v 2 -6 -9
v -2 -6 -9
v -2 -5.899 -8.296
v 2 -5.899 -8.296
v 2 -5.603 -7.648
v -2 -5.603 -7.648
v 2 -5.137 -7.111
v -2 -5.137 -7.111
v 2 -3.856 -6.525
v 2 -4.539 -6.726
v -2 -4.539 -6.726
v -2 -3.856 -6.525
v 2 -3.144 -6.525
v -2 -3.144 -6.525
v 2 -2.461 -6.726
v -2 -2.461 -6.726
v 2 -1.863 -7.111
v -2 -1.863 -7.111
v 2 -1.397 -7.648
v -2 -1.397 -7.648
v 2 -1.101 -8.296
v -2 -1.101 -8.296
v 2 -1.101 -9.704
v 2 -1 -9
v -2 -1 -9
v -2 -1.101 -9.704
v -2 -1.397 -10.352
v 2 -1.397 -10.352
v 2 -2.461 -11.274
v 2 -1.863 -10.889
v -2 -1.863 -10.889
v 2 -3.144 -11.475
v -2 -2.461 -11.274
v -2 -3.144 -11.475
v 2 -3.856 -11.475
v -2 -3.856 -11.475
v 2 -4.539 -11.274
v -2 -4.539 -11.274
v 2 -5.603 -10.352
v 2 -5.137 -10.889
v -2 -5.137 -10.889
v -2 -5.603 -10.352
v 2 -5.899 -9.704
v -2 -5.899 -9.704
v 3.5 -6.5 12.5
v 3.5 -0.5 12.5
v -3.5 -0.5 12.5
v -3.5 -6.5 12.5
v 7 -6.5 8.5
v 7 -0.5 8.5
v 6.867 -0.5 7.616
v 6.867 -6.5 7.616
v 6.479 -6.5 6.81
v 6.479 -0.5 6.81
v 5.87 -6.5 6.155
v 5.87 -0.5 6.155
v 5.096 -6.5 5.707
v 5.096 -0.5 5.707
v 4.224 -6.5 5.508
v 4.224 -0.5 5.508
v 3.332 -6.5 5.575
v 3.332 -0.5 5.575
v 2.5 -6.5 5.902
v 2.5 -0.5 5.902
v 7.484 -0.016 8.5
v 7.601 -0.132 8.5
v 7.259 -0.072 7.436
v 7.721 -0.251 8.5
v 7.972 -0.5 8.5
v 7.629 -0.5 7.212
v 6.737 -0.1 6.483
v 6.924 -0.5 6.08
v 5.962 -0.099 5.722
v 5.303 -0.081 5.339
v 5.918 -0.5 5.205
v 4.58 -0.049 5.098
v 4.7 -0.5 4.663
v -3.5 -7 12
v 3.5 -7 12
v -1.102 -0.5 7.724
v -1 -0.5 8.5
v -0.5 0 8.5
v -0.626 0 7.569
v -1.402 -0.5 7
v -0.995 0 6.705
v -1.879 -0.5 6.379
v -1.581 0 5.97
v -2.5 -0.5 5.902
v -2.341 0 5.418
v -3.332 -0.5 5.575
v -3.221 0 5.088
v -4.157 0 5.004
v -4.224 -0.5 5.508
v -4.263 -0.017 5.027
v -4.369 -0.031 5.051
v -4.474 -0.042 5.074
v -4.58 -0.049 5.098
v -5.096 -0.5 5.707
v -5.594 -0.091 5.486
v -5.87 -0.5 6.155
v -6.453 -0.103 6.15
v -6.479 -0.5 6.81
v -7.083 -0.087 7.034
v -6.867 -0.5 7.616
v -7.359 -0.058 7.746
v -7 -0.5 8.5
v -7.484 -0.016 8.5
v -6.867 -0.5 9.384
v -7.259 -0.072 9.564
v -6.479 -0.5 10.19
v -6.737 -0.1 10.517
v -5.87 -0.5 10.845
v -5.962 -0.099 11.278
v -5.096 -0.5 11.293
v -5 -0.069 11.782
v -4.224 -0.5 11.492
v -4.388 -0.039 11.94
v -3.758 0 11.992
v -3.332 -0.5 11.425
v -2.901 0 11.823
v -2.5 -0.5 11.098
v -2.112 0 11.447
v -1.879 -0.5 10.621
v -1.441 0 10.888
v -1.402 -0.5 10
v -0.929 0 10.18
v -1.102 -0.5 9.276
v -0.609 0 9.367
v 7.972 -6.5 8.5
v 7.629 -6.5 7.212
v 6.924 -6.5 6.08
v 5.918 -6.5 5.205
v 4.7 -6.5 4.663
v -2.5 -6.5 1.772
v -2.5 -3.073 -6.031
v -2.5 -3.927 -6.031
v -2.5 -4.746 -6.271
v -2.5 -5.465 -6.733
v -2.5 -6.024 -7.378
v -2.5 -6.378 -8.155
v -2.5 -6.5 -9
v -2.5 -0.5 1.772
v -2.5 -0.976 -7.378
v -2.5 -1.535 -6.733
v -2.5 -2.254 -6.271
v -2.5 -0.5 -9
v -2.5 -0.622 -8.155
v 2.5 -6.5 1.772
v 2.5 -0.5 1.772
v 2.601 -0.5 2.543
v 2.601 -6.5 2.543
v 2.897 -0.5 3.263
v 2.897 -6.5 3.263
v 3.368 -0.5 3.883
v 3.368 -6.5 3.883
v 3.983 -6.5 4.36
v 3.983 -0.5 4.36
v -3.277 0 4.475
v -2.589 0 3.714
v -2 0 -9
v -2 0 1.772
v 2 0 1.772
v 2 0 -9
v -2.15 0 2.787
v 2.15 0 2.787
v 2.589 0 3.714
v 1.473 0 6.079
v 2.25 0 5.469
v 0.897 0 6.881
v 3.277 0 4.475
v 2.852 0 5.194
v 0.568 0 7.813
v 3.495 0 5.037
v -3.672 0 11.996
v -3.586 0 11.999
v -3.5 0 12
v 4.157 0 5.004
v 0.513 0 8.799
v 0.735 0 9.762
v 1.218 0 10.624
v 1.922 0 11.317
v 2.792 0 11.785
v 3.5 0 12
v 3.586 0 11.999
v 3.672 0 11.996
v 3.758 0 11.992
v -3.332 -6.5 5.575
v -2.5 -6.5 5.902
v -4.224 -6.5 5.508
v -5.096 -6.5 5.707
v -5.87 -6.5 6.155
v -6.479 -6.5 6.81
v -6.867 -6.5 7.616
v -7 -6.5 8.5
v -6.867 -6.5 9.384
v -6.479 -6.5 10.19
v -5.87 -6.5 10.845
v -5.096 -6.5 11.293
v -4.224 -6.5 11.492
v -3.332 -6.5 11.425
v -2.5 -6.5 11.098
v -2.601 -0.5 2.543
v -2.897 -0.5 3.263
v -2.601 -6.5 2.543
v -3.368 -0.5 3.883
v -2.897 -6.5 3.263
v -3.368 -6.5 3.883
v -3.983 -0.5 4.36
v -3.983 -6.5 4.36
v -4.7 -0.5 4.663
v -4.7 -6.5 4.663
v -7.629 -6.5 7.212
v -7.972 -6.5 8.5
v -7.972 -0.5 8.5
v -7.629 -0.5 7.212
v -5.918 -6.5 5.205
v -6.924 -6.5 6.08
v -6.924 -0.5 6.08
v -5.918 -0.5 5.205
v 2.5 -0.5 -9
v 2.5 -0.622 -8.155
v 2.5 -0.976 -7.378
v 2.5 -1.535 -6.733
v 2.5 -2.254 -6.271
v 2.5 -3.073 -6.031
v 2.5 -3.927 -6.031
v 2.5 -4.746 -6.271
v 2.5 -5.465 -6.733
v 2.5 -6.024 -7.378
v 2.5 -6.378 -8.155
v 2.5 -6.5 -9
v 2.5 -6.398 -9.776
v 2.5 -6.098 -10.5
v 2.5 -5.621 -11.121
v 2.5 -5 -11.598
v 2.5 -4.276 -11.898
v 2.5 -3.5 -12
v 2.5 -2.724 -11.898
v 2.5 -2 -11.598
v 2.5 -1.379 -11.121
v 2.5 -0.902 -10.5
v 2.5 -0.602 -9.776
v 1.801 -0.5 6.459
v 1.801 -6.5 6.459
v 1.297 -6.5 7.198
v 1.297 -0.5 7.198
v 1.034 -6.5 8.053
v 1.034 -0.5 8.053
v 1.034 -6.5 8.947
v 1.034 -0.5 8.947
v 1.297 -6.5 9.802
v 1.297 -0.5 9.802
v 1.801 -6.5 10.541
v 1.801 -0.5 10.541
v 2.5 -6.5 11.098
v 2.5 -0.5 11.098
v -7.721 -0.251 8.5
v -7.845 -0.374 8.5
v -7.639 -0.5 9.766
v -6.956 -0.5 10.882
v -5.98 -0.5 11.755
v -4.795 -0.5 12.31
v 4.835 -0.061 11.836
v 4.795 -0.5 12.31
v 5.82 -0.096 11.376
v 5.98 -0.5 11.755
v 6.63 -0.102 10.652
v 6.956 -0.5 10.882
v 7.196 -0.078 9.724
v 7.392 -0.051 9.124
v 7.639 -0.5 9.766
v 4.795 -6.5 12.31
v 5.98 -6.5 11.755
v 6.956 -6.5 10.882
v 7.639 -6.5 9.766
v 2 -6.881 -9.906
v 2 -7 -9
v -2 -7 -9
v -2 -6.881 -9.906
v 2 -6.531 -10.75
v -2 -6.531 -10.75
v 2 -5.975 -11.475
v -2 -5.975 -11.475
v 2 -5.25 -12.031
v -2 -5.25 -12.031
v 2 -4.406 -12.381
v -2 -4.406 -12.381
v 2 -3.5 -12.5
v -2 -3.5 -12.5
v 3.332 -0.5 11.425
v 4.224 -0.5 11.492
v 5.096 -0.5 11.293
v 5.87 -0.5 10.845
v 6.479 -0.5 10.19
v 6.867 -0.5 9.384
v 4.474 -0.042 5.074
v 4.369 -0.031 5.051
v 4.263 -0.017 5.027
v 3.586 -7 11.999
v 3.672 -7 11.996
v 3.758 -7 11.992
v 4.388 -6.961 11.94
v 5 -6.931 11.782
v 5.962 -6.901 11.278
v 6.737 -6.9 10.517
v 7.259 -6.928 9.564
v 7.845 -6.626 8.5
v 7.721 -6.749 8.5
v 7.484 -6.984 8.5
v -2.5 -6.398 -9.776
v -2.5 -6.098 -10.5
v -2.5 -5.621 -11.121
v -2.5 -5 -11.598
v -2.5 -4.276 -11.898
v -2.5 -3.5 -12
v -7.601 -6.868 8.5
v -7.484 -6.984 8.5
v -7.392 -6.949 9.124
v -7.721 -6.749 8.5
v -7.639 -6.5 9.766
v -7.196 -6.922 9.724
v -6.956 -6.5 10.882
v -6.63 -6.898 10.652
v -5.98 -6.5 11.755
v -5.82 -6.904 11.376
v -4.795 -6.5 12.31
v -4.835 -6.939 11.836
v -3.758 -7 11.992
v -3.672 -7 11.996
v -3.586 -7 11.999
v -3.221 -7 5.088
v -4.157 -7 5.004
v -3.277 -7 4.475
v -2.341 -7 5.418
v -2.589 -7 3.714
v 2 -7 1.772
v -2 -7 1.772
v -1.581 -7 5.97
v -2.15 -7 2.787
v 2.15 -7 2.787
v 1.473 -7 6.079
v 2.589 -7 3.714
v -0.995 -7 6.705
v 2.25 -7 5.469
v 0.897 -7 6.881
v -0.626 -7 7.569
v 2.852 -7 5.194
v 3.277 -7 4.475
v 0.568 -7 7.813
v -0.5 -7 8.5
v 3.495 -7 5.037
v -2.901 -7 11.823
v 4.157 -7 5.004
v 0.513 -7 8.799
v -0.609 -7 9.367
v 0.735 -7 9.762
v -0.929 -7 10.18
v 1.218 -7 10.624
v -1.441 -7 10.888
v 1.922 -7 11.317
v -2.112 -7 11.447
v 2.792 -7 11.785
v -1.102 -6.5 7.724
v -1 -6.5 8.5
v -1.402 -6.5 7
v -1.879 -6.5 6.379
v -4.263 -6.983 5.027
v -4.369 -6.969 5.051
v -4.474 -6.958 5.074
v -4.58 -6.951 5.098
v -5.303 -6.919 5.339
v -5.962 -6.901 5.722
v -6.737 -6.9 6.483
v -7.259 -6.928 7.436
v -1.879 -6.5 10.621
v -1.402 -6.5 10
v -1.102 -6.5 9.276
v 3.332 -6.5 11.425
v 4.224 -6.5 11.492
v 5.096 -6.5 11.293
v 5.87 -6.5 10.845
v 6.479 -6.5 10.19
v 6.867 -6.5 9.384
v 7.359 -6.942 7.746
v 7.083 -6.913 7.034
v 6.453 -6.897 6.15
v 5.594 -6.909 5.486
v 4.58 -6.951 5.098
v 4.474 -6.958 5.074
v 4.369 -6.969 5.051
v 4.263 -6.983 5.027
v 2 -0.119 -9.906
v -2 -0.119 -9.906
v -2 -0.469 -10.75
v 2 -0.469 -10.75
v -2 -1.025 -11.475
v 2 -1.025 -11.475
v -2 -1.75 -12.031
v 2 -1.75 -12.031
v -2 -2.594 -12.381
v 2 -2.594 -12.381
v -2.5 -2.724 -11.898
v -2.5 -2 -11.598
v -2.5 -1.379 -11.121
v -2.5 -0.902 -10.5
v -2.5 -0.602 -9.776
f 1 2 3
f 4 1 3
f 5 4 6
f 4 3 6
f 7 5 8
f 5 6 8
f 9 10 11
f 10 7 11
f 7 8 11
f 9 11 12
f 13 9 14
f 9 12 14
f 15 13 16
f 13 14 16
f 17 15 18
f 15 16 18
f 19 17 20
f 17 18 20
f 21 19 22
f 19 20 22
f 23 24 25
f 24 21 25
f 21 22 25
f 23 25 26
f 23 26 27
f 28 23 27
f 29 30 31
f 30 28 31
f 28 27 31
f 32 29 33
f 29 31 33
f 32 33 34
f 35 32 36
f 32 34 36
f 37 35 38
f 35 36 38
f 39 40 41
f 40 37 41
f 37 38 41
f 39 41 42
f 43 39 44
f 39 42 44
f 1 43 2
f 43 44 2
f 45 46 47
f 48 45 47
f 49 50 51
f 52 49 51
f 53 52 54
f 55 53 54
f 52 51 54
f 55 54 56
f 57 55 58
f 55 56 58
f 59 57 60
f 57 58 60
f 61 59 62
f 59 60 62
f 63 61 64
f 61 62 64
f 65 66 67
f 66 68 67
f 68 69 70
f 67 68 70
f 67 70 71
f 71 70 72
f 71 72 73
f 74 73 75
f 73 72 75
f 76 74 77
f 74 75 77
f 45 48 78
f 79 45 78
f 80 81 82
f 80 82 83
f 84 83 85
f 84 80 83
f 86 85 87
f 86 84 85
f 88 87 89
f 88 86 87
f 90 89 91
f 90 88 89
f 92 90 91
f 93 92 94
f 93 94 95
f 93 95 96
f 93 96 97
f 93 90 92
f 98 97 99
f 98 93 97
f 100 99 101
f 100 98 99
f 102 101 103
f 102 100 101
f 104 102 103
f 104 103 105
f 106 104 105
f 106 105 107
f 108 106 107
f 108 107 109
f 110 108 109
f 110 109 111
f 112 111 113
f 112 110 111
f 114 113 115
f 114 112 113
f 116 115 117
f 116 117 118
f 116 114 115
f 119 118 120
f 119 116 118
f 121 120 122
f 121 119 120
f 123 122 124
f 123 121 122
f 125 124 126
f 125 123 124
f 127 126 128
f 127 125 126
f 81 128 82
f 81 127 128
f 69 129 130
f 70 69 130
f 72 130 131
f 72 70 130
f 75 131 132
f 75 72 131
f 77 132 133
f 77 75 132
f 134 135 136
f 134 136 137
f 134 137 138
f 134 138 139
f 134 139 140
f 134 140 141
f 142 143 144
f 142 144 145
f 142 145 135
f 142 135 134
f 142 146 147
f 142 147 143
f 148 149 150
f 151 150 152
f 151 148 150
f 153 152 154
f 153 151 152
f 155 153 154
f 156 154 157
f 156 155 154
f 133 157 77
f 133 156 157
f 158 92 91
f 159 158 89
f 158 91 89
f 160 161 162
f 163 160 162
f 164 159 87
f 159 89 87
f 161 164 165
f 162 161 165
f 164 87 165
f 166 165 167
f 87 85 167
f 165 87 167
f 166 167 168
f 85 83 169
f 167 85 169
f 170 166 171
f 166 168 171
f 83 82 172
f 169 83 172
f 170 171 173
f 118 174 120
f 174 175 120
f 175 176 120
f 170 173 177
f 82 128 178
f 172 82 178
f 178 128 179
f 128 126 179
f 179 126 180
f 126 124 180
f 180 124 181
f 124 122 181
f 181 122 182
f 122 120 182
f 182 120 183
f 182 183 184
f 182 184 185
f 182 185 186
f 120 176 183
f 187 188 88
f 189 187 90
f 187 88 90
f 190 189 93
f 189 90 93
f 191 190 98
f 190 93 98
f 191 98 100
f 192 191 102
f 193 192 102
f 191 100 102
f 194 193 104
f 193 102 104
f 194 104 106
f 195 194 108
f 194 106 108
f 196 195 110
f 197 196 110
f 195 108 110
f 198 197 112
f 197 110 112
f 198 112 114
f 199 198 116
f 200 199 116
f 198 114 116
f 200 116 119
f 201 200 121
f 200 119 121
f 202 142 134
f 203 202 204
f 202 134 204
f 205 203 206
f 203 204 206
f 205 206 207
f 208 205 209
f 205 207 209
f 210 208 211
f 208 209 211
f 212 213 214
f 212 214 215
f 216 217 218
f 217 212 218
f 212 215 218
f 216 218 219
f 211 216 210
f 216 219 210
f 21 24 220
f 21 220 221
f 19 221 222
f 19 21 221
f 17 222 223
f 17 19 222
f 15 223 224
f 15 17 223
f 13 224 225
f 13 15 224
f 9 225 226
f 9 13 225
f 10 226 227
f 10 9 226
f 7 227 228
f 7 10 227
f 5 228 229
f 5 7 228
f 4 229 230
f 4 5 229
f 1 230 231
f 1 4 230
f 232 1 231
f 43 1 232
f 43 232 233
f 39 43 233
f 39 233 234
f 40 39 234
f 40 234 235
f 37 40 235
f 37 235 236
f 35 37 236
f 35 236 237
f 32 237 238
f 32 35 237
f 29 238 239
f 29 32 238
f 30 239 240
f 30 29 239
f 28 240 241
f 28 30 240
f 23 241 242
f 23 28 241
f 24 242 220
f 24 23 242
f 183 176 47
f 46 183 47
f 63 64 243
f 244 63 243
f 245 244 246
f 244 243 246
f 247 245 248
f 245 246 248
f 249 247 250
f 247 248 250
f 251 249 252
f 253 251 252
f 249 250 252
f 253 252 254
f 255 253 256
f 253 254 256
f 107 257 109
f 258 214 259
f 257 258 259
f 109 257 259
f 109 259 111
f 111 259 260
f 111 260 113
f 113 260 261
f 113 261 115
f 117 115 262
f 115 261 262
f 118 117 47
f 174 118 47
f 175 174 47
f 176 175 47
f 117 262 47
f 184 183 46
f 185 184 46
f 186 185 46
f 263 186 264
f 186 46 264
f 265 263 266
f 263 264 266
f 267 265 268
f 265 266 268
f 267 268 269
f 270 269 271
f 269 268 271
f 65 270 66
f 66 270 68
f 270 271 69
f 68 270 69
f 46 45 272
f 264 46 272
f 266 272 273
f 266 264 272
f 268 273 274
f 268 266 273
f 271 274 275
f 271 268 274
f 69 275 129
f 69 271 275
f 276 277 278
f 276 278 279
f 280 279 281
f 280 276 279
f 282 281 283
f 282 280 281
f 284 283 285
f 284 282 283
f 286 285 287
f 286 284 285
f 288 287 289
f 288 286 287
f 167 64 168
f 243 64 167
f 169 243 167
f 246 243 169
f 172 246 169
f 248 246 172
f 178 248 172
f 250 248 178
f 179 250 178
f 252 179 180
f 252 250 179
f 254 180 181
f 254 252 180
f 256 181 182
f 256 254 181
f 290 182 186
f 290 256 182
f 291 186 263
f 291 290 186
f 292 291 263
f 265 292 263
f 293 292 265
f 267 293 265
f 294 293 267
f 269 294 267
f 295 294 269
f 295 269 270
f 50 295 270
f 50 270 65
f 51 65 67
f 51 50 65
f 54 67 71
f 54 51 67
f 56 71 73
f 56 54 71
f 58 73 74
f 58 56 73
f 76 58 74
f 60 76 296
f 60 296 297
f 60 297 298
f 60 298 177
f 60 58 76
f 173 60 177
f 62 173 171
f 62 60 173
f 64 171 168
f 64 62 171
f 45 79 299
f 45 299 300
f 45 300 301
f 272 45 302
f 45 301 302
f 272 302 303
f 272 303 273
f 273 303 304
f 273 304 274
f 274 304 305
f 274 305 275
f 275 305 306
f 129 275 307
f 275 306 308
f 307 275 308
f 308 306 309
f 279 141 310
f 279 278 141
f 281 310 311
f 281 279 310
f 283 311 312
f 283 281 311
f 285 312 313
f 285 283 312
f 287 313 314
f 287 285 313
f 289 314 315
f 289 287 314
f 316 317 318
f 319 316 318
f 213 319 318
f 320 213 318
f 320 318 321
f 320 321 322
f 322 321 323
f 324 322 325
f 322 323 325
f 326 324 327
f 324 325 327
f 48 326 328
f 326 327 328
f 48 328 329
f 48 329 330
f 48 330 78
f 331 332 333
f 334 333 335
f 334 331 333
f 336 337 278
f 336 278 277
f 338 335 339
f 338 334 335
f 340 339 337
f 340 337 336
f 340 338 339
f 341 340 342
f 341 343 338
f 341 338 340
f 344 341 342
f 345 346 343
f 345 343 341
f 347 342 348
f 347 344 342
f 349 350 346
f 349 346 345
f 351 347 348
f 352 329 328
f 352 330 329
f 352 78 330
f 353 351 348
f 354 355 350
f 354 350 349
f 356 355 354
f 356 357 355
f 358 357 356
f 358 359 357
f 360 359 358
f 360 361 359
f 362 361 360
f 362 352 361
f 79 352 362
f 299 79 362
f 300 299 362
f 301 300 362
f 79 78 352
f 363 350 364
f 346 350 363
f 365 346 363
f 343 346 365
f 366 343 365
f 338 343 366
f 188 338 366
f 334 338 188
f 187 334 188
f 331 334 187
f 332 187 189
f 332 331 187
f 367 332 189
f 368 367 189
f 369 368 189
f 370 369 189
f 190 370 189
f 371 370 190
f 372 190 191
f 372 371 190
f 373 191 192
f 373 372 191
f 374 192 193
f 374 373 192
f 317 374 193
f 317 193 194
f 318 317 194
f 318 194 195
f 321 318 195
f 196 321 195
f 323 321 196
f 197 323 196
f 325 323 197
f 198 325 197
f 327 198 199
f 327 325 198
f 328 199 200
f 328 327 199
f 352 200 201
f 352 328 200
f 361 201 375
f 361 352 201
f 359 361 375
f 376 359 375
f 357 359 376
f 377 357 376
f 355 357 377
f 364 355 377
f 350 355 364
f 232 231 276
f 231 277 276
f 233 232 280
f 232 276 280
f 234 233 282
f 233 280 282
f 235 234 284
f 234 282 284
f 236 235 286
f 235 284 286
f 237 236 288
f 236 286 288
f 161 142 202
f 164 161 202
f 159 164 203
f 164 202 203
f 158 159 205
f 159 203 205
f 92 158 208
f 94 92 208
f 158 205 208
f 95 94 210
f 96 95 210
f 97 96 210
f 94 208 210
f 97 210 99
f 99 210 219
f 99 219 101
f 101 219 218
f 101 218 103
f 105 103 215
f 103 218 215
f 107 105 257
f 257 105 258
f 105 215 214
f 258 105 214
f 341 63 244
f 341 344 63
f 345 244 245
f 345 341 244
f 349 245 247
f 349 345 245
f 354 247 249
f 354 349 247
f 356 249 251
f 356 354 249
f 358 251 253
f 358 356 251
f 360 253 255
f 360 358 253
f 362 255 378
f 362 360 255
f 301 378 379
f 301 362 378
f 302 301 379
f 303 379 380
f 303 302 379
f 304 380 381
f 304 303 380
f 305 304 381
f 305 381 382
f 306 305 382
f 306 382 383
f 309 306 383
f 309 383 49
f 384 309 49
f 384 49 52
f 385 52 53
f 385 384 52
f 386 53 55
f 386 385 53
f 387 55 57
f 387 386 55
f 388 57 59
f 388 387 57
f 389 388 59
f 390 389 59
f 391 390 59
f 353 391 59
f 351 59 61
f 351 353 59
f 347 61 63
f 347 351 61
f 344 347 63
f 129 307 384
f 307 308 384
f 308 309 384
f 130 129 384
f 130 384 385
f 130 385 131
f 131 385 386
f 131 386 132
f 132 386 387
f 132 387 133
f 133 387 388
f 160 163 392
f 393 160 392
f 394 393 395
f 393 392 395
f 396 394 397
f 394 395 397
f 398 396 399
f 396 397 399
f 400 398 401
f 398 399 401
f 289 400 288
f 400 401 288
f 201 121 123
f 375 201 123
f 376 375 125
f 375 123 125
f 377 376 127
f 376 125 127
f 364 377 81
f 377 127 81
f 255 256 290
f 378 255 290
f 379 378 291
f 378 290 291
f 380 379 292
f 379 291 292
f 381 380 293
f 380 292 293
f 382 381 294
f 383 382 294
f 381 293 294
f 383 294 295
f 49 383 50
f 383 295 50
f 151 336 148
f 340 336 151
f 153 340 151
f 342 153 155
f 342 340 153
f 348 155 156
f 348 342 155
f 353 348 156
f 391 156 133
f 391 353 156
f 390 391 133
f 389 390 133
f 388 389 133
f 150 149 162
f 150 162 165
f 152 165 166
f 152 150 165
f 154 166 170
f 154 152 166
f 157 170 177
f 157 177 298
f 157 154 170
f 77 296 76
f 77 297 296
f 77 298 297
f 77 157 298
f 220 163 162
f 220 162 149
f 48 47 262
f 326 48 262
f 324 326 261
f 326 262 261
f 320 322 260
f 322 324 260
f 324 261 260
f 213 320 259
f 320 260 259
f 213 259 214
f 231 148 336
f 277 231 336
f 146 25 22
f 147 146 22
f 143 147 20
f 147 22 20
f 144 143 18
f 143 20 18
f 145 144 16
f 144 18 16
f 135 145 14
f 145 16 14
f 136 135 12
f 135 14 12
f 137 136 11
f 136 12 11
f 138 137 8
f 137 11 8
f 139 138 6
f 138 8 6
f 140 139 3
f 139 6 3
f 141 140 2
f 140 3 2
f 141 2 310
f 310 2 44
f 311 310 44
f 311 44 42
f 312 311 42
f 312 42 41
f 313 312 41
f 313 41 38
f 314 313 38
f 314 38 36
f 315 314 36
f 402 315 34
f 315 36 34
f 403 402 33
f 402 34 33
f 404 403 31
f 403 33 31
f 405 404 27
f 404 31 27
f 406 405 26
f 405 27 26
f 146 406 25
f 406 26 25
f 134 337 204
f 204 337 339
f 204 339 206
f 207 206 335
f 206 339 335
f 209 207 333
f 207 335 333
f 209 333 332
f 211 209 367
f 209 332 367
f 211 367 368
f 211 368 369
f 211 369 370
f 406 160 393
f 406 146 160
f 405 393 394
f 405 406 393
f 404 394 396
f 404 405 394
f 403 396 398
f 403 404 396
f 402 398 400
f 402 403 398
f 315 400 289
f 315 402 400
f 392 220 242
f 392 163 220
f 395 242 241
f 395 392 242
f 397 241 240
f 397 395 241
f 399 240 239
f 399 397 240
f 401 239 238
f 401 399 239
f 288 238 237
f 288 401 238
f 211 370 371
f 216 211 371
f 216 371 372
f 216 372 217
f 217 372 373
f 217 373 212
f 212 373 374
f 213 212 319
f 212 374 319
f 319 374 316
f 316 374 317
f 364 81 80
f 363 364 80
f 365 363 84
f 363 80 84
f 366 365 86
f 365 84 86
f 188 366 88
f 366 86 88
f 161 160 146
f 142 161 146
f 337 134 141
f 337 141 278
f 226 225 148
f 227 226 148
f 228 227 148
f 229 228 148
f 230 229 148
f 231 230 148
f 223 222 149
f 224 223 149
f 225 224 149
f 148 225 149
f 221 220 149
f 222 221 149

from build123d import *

# Parameters (mm, degrees)
F0_W         = 5
F0_H         = 17
F1_DEPTH     = 7
F3_D         = 5
F4_T1_DEPTH  = 29.5
F5_R         = 3.49999
F6_R         = 3
F7_T1_DEPTH  = 10.7715938526
F7_T3_DEPTH  = 7
F7_T5_DEPTH  = 2e-05
F7_T16_ANGLE = 74.5339900582
F7_T18_ANGLE = 117.281460121
F7_T20_ANGLE = 132.7531885059
F7_T22_ANGLE = 74.5339900582
F7_T24_ANGLE = 117.281460121
F7_T26_ANGLE = 132.7531885059
F7_T28_ANGLE = 90
F7_T30_ANGLE = 90
F7_T34_ANGLE = 74.5339900582
F7_T36_ANGLE = 90
F7_T38_ANGLE = 117.281460121
F7_T40_ANGLE = 90
F7_T44_ANGLE = 132.7531885059
F7_T46_ANGLE = 74.5339900582
F7_T48_ANGLE = 117.281460121
F7_T50_ANGLE = 132.7531885059


# Not quite as in the source:
# - a fillet or chamfer that OpenCascade refuses, or shapes differently, is made with other operations: its cross-section is extruded or revolved along the edge and cut away or added
# - two fillets or chamfers of one size are made in one step
# - a fillet or chamfer is up to 0.001 mm smaller than in the source, because OpenCascade refuses the exact size


with BuildPart() as f1:
    # F0 (on Front) → F1 (new body)
    with BuildSketch(Plane.XZ):
        with BuildLine():
            Line((8, 12.5), (2.5, 12.5))
            Line((2.5, 12.5), (2.5, 11.0980762114))
            ThreePointArc((2.5, 11.0980762114), (5.5, 11.0980762114), (7, 8.5))
            ThreePointArc((7, 8.5), (5.5, 5.9019237886), (2.5, 5.9019237886))
            Line((2.5, 5.9019237886), (2.5, 4.5))
            Line((2.5, 4.5), (8, 4.5))
            Line((8, 4.5), (8, 12.5))
        make_face()
        with BuildLine():
            Line((-2.5, 11.0980762114), (-2.5, 12.5))
            Line((-2.5, 12.5), (-8, 12.5))
            Line((-8, 12.5), (-8, 4.5))
            Line((-8, 4.5), (-2.5, 4.5))
            Line((-2.5, 4.5), (-2.5, 5.9019237886))
            ThreePointArc((-2.5, 5.9019237886), (-7, 8.5), (-2.5, 11.0980762114))
        make_face()
        with BuildLine():
            Line((2.5, 11.0980762114), (2.5, 12.5))
            Line((2.5, 12.5), (-2.5, 12.5))
            Line((-2.5, 12.5), (-2.5, 11.0980762114))
            ThreePointArc((-2.5, 11.0980762114), (-1.4019237886, 10), (-1, 8.5))
            ThreePointArc((-1, 8.5), (-1.4019237886, 7), (-2.5, 5.9019237886))
            Line((-2.5, 5.9019237886), (-2.5, 4.5))
            Line((-2.5, 4.5), (2.5, 4.5))
            Line((2.5, 4.5), (2.5, 5.9019237886))
            ThreePointArc((2.5, 5.9019237886), (1, 8.5), (2.5, 11.0980762114))
        make_face()
        with Locations((0, -4)):
            Rectangle(F0_W, F0_H)
    extrude(amount=F1_DEPTH)

    # F3 (through all)
    with Locations(Plane.YZ.offset(2.5)):
        with Locations((-3.5, -9)):
            Hole(F3_D / 2)

    # F4: fillet of radius 4.5 on 4 edges, made by hand

    # F4_s2 → F4_t1 (cut)
    with BuildSketch(Plane.XZ.offset(-11.25)):
        with BuildLine():
            ThreePointArc((3.5, 12.5), (6.6819805153, 11.1819805153), (8, 8))
            Line((8, 8), (8, 12.5))
            Line((8, 12.5), (3.5, 12.5))
        make_face()
        with BuildLine():
            ThreePointArc((-3.5, 12.5), (-6.6819805153, 11.1819805153), (-8, 8))
            Line((-8, 8), (-8, 12.5))
            Line((-8, 12.5), (-3.5, 12.5))
        make_face()
        with BuildLine():
            ThreePointArc((8, 9), (6.6819805153, 5.8180194847), (3.5, 4.5))
            Line((3.5, 4.5), (8, 4.5))
            Line((8, 4.5), (8, 9))
        make_face()
        with BuildLine():
            ThreePointArc((-8, 9), (-6.6819805153, 5.8180194847), (-3.5, 4.5))
            Line((-3.5, 4.5), (-8, 4.5))
            Line((-8, 4.5), (-8, 9))
        make_face()
    extrude(amount=F4_T1_DEPTH, mode=Mode.SUBTRACT)

    # F5 (radius 3.5 in the source; OpenCascade refuses exactly that, so slightly less here)
    f5_edges = [f1.edges().sort_by_distance(p)[0] for p in [
        (0, 0, -12.5),
        (0, -7, -12.5),
    ]]
    fillet(f5_edges, radius=F5_R)

    # F6
    f6_edges = [f1.edges().sort_by_distance(p)[0] for p in [
        (2.5, -3.5, 4.5),
        (-2.5, -3.5, 4.5),
    ]]
    fillet(f6_edges, radius=F6_R)

    # F7: chamfer of 0.5 on 30 edges, made by hand

    # F7_s2 → F7_t1 (cut)
    with BuildSketch(Plane.XY.offset(-9.00001)):
        Polygon((2, 0), (2.5, -0.5), (2.5, 0), align=None)
        Polygon((-2, 0), (-2.5, -0.5), (-2.5, 0), align=None)
        Polygon((2.5, -6.5), (2, -7), (2.5, -7), align=None)
        Polygon((-2.5, -6.5), (-2, -7), (-2.5, -7), align=None)
    extrude(amount=F7_T1_DEPTH, mode=Mode.SUBTRACT)

    # F7_s4 → F7_t3 (cut)
    with BuildSketch(Plane.YZ.offset(-3.5)):
        Polygon((0, 12), (-0.5, 12.5), (0, 12.5), align=None)
        Polygon((-6.5, 12.5), (-7, 12), (-7, 12.5), align=None)
    extrude(amount=F7_T3_DEPTH, mode=Mode.SUBTRACT)

    # F7_s6 → F7_t5 (cut)
    with BuildSketch(Plane.XZ.offset(3.49999)):
        Polygon((2.5, -12), (2, -12.5), (2.5, -12.5), align=None)
        Polygon((-2.5, -12), (-2, -12.5), (-2.5, -12.5), align=None)
    extrude(amount=F7_T5_DEPTH, mode=Mode.SUBTRACT)

    # F7_s7 → F7_t8 (revolve, cut)
    with BuildSketch(Plane.XY.offset(8.5)):
        Polygon((-1, -6.5), (-0.5, -7), (-1, -7), align=None)
    revolve(axis=Axis((-4, -7, 8.5), (0, 1, 0)), mode=Mode.SUBTRACT)

    # F7_s9 → F7_t10 (revolve, cut)
    with BuildSketch(Plane(origin=(-0.6806079661, 0, 0.3929491924), x_dir=(0, 1, 0), z_dir=(0.8660254038, 0, -0.5))):
        Polygon((-6.5, 6.3612159322), (-7, 5.8612159322), (-7, 6.3612159322), align=None)
    revolve(axis=Axis((4, -7, 8.5), (0, 1, 0)), mode=Mode.SUBTRACT)

    # F7_s11 → F7_t12 (revolve, cut)
    with BuildSketch(Plane.XY.offset(8.5)):
        Polygon((-0.5, 0), (-1, -0.5), (-1, 0), align=None)
    revolve(axis=Axis((-4, 0, 8.5), (0, 1, 0)), mode=Mode.SUBTRACT)

    # F7_s13 → F7_t14 (revolve, cut)
    with BuildSketch(Plane(origin=(-0.6806079661, 0, 0.3929491924), x_dir=(0, 1, 0), z_dir=(0.8660254038, 0, -0.5))):
        Polygon((0, 5.8612159322), (-0.5, 6.3612159322), (0, 6.3612159322), align=None)
    revolve(axis=Axis((4, 0, 8.5), (0, 1, 0)), mode=Mode.SUBTRACT)

    # F7_s15 → F7_t16 (revolve, cut)
    with BuildSketch(Plane.XY.offset(1.771583853)):
        Polygon((2, 0), (2.5000000001, -0.5), (2.5, 0), align=None)
    revolve(axis=Axis((5.4999999996, 0, 1.771583853), (0, 1, 0)), revolution_arc=F7_T16_ANGLE, mode=Mode.SUBTRACT)

    # F7_s17 → F7_t18 (revolve, cut)
    with BuildSketch(Plane(origin=(-2.8735542897, 0, 3.1088689023), x_dir=(0, 1, 0), z_dir=(-0.6787683205, 0, 0.7343524815))):
        Polygon((0, -12.6791485698), (-0.5, -13.1791485698), (0, -13.1791485698), align=None)
    revolve(axis=Axis((3.4999999999, 0, 9.0000000001), (0, 1, 0)), revolution_arc=F7_T18_ANGLE, mode=Mode.SUBTRACT)

    # F7_s19 → F7_t20 (revolve, cut)
    with BuildSketch(Plane.YZ.offset(3.4999999999)):
        Polygon((0, 12), (-0.5, 12.5), (0, 12.5), align=None)
    revolve(axis=Axis((3.4999999999, 0, 7.9999999999), (0, 1, 0)), revolution_arc=F7_T20_ANGLE, mode=Mode.SUBTRACT)

    # F7_s21 → F7_t22 (revolve, cut)
    with BuildSketch(Plane.XY.offset(1.771583853)):
        Polygon((-2, 0), (-2.5000000001, -0.5), (-2.5, 0), align=None)
    revolve(axis=Axis((-5.4999999996, 0, 1.771583853), (0, -1, 0)), revolution_arc=F7_T22_ANGLE, mode=Mode.SUBTRACT)

    # F7_s23 → F7_t24 (revolve, cut)
    with BuildSketch(Plane(origin=(-5.5642042783, 0, 1.5395362318), x_dir=(0, 1, 0), z_dir=(0.9637888196, 0, -0.2666666667))):
        Polygon((0, 3.7407660435), (-0.5, 3.2407660435), (0, 3.2407660435), align=None)
    revolve(axis=Axis((-3.4999999999, 0, 9.0000000001), (0, 1, 0)), revolution_arc=F7_T24_ANGLE, mode=Mode.SUBTRACT)

    # F7_s25 → F7_t26 (revolve, cut)
    with BuildSketch(Plane(origin=(-5.6005949978, 0, 6.0580131587), x_dir=(0, 1, 0), z_dir=(0.6788416095, 0, -0.7342847331))):
        Polygon((0, -1.1392636899), (-0.5, -1.6392636899), (0, -1.6392636899), align=None)
    revolve(axis=Axis((-3.4999999999, 0, 7.9999999999), (0, 1, 0)), revolution_arc=F7_T26_ANGLE, mode=Mode.SUBTRACT)

    # F7_s27 → F7_t28 (revolve, cut)
    with BuildSketch(Plane.XY.offset(-9.00001)):
        Polygon((2.5, -0.5), (2, 0), (2.5, 0), align=None)
    revolve(axis=Axis((2.5, -3.49999, -9.00001), (-1, 0, 0)), revolution_arc=F7_T28_ANGLE, mode=Mode.SUBTRACT)

    # F7_s29 → F7_t30 (revolve, cut)
    with BuildSketch(Plane.XY.offset(-9.00001)):
        Polygon((2.5, -6.5), (2, -7), (2.5, -7), align=None)
    revolve(axis=Axis((2.5, -3.50001, -9.00001), (1, 0, 0)), revolution_arc=F7_T30_ANGLE, mode=Mode.SUBTRACT)

    # F7_s31 → F7_t32 (revolve, cut)
    with BuildSketch(Plane.XY.offset(-9)):
        Polygon((2.5, -0.5), (2, -1), (2.5, -1), align=None)
    revolve(axis=Axis((2.5, -3.5, -9), (1, 0, 0)), mode=Mode.SUBTRACT)

    # F7_s33 → F7_t34 (revolve, cut)
    with BuildSketch(Plane.XY.offset(1.771583853)):
        Polygon((2.5000000001, -6.5), (2, -7), (2.5, -7), align=None)
    revolve(axis=Axis((5.4999999996, -7, 1.771583853), (0, 1, 0)), revolution_arc=F7_T34_ANGLE, mode=Mode.SUBTRACT)

    # F7_s35 → F7_t36 (revolve, cut)
    with BuildSketch(Plane.XY.offset(-9.00001)):
        Polygon((-2, 0), (-2.5, -0.5), (-2.5, 0), align=None)
    revolve(axis=Axis((-2.5, -3.49999, -9.00001), (-1, 0, 0)), revolution_arc=F7_T36_ANGLE, mode=Mode.SUBTRACT)

    # F7_s37 → F7_t38 (revolve, cut)
    with BuildSketch(Plane(origin=(-2.8735542897, 0, 3.1088689023), x_dir=(0, 1, 0), z_dir=(-0.6787683205, 0, 0.7343524815))):
        Polygon((-6.5, -13.1791485698), (-7, -12.6791485698), (-7, -13.1791485698), align=None)
    revolve(axis=Axis((3.4999999999, -7, 9.0000000001), (0, 1, 0)), revolution_arc=F7_T38_ANGLE, mode=Mode.SUBTRACT)

    # F7_s39 → F7_t40 (revolve, cut)
    with BuildSketch(Plane.XY.offset(-9.00001)):
        Polygon((-2.5, -6.5), (-2, -7), (-2.5, -7), align=None)
    revolve(axis=Axis((-2.5, -3.50001, -9.00001), (1, 0, 0)), revolution_arc=F7_T40_ANGLE, mode=Mode.SUBTRACT)

    # F7_s41 → F7_t42 (revolve, cut)
    with BuildSketch(Plane.XY.offset(-9)):
        Polygon((-2.5, -0.5), (-2, -1), (-2.5, -1), align=None)
    revolve(axis=Axis((-2.5, -3.5, -9), (1, 0, 0)), mode=Mode.SUBTRACT)

    # F7_s43 → F7_t44 (revolve, cut)
    with BuildSketch(Plane.YZ.offset(3.4999999999)):
        Polygon((-6.5, 12.5), (-7, 12), (-7, 12.5), align=None)
    revolve(axis=Axis((3.4999999999, -7, 7.9999999999), (0, 1, 0)), revolution_arc=F7_T44_ANGLE, mode=Mode.SUBTRACT)

    # F7_s45 → F7_t46 (revolve, cut)
    with BuildSketch(Plane.XY.offset(1.771583853)):
        Polygon((-2.5000000001, -6.5), (-2, -7), (-2.5, -7), align=None)
    revolve(axis=Axis((-5.4999999996, -7, 1.771583853), (0, -1, 0)), revolution_arc=F7_T46_ANGLE, mode=Mode.SUBTRACT)

    # F7_s47 → F7_t48 (revolve, cut)
    with BuildSketch(Plane(origin=(-5.5642042783, 0, 1.5395362318), x_dir=(0, 1, 0), z_dir=(0.9637888196, 0, -0.2666666667))):
        Polygon((-6.5, 3.2407660435), (-7, 3.7407660435), (-7, 3.2407660435), align=None)
    revolve(axis=Axis((-3.4999999999, -7, 9.0000000001), (0, 1, 0)), revolution_arc=F7_T48_ANGLE, mode=Mode.SUBTRACT)

    # F7_s49 → F7_t50 (revolve, cut)
    with BuildSketch(Plane(origin=(-5.6005949978, 0, 6.0580131587), x_dir=(0, 1, 0), z_dir=(0.6788416095, 0, -0.7342847331))):
        Polygon((-6.5, -1.6392636899), (-7, -1.1392636899), (-7, -1.6392636899), align=None)
    revolve(axis=Axis((-3.4999999999, -7, 7.9999999999), (0, 1, 0)), revolution_arc=F7_T50_ANGLE, mode=Mode.SUBTRACT)


solid = f1.part
